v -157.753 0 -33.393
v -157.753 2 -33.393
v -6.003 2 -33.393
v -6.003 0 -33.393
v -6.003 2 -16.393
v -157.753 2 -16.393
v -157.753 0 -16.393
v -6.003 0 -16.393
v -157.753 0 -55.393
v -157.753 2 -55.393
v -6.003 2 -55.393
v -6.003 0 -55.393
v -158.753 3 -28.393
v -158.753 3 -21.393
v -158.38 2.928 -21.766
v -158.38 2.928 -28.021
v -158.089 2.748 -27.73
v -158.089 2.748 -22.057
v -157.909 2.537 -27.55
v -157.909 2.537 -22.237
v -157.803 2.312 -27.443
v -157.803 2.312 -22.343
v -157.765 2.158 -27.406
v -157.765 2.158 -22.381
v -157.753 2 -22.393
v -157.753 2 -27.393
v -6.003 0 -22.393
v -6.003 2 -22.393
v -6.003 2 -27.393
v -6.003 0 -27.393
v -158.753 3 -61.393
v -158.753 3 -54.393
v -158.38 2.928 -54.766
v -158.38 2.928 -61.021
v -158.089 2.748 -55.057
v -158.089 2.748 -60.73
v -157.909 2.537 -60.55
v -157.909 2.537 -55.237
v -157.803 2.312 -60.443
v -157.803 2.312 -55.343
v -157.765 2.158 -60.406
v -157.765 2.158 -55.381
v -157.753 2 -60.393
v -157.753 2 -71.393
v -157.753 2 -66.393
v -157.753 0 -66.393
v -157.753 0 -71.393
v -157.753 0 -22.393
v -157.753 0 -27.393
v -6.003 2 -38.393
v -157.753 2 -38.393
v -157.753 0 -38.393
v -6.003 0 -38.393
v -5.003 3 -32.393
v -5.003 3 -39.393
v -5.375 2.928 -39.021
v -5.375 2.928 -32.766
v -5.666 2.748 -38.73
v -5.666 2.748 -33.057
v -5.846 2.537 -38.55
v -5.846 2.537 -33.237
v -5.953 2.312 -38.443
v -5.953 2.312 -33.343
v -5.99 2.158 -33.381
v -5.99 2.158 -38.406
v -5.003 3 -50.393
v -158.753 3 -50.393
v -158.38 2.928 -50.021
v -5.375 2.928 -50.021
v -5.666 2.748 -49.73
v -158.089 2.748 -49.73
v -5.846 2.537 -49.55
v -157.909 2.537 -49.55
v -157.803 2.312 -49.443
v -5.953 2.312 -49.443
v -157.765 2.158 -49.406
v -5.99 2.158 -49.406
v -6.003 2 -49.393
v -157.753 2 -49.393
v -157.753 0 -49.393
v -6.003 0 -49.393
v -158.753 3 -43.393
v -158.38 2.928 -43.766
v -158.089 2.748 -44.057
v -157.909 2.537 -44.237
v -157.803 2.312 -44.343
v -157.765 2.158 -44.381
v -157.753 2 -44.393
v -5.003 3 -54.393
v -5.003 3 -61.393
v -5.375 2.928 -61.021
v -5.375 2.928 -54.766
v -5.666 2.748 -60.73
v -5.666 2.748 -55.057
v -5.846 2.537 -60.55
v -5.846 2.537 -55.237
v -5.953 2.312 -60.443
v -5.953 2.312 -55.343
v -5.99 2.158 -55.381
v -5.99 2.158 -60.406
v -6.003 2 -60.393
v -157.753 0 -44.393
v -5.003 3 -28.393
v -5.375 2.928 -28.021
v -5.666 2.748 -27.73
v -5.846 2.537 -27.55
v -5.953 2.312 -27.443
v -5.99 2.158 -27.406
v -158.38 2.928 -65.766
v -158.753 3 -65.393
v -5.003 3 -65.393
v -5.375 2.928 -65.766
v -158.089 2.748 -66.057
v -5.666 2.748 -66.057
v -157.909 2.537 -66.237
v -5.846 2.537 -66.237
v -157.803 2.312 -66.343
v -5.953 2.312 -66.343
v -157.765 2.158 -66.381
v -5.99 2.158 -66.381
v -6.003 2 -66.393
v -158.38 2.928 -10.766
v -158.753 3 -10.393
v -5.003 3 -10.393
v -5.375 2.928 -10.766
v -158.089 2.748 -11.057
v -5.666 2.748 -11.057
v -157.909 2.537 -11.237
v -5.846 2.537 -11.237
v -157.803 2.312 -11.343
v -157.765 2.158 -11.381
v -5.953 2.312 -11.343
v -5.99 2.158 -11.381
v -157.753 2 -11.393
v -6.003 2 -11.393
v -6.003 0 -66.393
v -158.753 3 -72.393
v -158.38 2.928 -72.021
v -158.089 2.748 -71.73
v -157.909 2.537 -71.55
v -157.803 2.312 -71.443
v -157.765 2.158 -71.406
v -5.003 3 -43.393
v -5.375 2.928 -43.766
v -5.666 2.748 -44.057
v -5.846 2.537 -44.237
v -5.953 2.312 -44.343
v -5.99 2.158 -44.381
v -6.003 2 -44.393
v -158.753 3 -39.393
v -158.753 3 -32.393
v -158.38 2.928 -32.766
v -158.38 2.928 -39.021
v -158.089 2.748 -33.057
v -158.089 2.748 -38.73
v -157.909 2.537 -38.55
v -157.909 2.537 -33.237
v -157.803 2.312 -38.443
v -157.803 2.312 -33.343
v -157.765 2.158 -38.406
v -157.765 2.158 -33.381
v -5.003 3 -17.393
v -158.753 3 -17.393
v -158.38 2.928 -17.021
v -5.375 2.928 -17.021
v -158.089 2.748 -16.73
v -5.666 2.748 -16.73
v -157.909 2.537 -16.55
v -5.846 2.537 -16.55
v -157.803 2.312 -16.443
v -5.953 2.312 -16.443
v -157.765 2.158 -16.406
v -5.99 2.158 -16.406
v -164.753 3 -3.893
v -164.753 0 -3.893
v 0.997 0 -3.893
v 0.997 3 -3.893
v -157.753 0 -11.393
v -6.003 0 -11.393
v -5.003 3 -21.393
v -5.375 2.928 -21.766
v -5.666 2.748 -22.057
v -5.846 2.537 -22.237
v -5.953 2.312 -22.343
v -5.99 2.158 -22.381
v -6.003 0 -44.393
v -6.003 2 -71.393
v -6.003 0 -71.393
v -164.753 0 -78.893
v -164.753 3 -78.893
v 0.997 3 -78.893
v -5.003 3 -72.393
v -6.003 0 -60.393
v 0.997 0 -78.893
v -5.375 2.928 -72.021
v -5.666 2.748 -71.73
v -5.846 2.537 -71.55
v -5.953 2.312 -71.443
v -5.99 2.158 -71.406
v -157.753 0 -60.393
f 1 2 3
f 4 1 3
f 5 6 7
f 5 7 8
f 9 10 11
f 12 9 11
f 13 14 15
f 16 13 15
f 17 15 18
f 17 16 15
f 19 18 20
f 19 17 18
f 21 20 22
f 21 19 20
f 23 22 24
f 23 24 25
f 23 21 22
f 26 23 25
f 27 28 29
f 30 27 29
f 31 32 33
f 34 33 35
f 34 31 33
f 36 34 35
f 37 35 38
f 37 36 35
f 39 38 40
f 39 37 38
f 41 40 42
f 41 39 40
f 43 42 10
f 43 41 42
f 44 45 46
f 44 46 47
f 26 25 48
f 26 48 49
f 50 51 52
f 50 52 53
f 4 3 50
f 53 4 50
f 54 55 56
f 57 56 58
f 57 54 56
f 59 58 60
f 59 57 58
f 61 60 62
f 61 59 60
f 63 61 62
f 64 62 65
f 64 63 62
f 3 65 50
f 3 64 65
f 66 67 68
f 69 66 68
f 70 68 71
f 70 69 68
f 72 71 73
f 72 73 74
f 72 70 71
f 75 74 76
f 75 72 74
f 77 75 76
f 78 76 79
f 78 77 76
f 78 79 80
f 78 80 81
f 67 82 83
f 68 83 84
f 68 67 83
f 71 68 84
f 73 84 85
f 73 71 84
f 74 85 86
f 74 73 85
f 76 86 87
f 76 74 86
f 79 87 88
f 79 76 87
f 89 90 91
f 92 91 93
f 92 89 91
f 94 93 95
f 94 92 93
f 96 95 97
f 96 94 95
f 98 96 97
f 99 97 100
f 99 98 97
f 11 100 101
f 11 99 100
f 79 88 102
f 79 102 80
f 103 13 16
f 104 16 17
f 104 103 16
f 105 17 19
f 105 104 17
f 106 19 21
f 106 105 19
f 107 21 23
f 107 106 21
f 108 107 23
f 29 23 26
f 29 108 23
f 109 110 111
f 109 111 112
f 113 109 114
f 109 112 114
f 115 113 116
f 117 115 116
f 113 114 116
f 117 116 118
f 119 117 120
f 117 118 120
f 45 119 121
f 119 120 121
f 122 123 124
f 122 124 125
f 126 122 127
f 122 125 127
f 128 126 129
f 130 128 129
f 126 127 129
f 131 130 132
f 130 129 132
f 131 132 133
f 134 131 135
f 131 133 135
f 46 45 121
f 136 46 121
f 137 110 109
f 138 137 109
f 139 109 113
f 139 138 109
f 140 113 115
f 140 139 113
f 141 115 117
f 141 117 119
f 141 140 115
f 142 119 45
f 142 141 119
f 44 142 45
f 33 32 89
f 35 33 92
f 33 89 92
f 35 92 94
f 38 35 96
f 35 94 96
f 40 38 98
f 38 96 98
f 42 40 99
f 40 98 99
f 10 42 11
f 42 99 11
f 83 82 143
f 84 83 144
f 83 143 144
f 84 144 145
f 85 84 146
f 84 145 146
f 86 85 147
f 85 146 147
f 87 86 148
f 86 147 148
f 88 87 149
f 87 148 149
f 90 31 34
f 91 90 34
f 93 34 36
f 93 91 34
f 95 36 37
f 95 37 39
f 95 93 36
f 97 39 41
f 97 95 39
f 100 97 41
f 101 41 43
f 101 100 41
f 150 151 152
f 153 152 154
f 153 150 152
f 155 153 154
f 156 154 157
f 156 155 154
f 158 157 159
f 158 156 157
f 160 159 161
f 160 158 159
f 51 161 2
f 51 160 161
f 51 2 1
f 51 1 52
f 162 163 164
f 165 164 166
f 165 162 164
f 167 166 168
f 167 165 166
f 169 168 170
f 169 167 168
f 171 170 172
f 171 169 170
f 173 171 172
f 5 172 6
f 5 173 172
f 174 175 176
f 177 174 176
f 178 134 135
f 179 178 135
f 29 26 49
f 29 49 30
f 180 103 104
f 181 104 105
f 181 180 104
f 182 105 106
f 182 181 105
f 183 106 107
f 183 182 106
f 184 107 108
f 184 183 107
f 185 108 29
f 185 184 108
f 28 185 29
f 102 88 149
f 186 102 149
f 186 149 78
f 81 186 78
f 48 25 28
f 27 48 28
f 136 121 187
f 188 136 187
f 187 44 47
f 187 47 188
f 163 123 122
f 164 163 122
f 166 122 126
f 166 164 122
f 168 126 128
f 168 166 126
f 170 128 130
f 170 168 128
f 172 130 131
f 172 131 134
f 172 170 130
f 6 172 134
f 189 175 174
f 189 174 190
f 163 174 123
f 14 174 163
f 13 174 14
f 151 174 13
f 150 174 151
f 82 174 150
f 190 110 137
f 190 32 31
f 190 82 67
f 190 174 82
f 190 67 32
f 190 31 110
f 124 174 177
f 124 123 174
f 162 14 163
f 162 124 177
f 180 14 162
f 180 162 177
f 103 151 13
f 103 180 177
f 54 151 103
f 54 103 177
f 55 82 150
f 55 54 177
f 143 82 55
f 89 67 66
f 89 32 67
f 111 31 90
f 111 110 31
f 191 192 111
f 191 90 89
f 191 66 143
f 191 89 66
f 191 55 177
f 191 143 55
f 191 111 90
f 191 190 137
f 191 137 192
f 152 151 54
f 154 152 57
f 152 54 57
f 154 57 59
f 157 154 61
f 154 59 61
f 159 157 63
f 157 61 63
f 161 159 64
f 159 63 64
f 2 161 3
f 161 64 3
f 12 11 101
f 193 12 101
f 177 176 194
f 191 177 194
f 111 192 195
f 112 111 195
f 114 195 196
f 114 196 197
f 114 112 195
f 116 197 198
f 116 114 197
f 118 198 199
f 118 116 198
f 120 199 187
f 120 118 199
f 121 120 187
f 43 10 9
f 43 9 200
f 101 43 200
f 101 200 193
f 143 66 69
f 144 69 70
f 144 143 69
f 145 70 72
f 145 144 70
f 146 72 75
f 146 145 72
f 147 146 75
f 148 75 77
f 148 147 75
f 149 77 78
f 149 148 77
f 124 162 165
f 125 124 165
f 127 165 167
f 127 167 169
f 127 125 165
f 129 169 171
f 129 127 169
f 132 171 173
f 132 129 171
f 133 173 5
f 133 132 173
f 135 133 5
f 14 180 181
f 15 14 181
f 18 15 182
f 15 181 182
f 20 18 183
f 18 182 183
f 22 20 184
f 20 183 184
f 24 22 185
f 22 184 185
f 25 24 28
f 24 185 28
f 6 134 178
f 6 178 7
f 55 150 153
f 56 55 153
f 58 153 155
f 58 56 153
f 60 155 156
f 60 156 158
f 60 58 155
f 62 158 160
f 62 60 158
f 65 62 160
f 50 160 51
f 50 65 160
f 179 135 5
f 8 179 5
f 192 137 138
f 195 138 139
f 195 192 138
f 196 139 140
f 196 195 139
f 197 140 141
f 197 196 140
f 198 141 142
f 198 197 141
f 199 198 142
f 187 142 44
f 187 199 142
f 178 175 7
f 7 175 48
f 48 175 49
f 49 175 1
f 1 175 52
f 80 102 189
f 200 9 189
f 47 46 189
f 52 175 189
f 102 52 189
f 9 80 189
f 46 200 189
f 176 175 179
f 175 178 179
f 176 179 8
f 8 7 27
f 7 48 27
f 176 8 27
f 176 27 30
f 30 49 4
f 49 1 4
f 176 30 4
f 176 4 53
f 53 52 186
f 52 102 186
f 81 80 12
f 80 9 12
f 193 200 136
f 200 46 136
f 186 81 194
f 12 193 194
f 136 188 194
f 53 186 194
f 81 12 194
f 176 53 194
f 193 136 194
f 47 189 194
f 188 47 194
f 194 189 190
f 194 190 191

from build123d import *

# Parameters (mm, degrees)
SKETCH1_W           = 165.75
SKETCH1_H           = 75
BOSS_EXTRUDE1_DEPTH = 3
SKETCH2_W           = 151.75
SKETCH2_H           = 5
CUT_EXTRUDE1_DEPTH  = 183.692731916
FILLET4_R           = 1
FILLET5_R           = 1
FILLET6_R           = 1
FILLET7_R           = 1
FILLET8_R           = 1
FILLET9_R           = 1
FILLET10_R          = 1
FILLET11_R          = 1
FILLET12_R          = 1
FILLET13_R          = 1
FILLET14_R          = 1
FILLET15_R          = 1
FILLET16_R          = 1
FILLET17_R          = 1
FILLET18_R          = 1
FILLET19_R          = 1
FILLET20_R          = 1
FILLET21_R          = 1
FILLET22_R          = 1
FILLET23_R          = 1
FILLET24_R          = 1
FILLET25_R          = 1
FILLET26_R          = 1
FILLET27_R          = 1


with BuildPart() as part:
    # Sketch1 → Boss-Extrude1 (new body)
    with BuildSketch(Plane(origin=(0, 0, 0), x_dir=(1, 0, 0), z_dir=(0, 1, 0))):
        with Locations((-81.877808989, 41.393258427)):
            Rectangle(SKETCH1_W, SKETCH1_H)
    extrude(amount=BOSS_EXTRUDE1_DEPTH)

    # Sketch2 → Cut-Extrude1 (cut, through all)
    with BuildSketch(Plane(origin=(0, 3, 0), x_dir=(1, 0, 0), z_dir=(0, 1, 0))):
        with Locations((-81.877808989, 68.893258427)):
            Rectangle(SKETCH2_W, SKETCH2_H)
        with Locations((-81.877808989, 57.893258427)):
            Rectangle(SKETCH2_W, SKETCH2_H)
        with Locations((-81.877808989, 46.893258427)):
            Rectangle(SKETCH2_W, SKETCH2_H)
        with Locations((-81.877808989, 35.893258427)):
            Rectangle(SKETCH2_W, SKETCH2_H)
        with Locations((-81.877808989, 24.893258427)):
            Rectangle(SKETCH2_W, SKETCH2_H)
        with Locations((-81.877808989, 13.893258427)):
            Rectangle(SKETCH2_W, SKETCH2_H)
    extrude(amount=-CUT_EXTRUDE1_DEPTH, mode=Mode.SUBTRACT)

    # Fillet4
    fillet4_edges = [part.edges().sort_by_distance(p)[0] for p in [
        (-81.877808989, 3, -60.393258427),
    ]]
    fillet(fillet4_edges, radius=FILLET4_R)

    # Fillet5
    fillet5_edges = [part.edges().sort_by_distance(p)[0] for p in [
        (-81.877808989, 3, -66.393258427),
    ]]
    fillet(fillet5_edges, radius=FILLET5_R)

    # Fillet6
    fillet6_edges = [part.edges().sort_by_distance(p)[0] for p in [
        (-81.877808989, 3, -49.393258427),
    ]]
    fillet(fillet6_edges, radius=FILLET6_R)

    # Fillet7
    fillet7_edges = [part.edges().sort_by_distance(p)[0] for p in [
        (-81.877808989, 3, -55.393258427),
    ]]
    fillet(fillet7_edges, radius=FILLET7_R)

    # Fillet8
    fillet8_edges = [part.edges().sort_by_distance(p)[0] for p in [
        (-81.877808989, 3, -38.393258427),
    ]]
    fillet(fillet8_edges, radius=FILLET8_R)

    # Fillet9
    fillet9_edges = [part.edges().sort_by_distance(p)[0] for p in [
        (-81.877808989, 3, -44.393258427),
    ]]
    fillet(fillet9_edges, radius=FILLET9_R)

    # Fillet10
    fillet10_edges = [part.edges().sort_by_distance(p)[0] for p in [
        (-81.877808989, 3, -33.393258427),
    ]]
    fillet(fillet10_edges, radius=FILLET10_R)

    # Fillet11
    fillet11_edges = [part.edges().sort_by_distance(p)[0] for p in [
        (-81.877808989, 3, -27.393258427),
    ]]
    fillet(fillet11_edges, radius=FILLET11_R)

    # Fillet12
    fillet12_edges = [part.edges().sort_by_distance(p)[0] for p in [
        (-81.877808989, 3, -22.393258427),
    ]]
    fillet(fillet12_edges, radius=FILLET12_R)

    # Fillet13
    fillet13_edges = [part.edges().sort_by_distance(p)[0] for p in [
        (-81.877808989, 3, -16.393258427),
    ]]
    fillet(fillet13_edges, radius=FILLET13_R)

    # Fillet14
    fillet14_edges = [part.edges().sort_by_distance(p)[0] for p in [
        (-81.877808989, 3, -11.393258427),
    ]]
    fillet(fillet14_edges, radius=FILLET14_R)

    # Fillet15
    fillet15_edges = [part.edges().sort_by_distance(p)[0] for p in [
        (-81.877808989, 3, -71.393258427),
    ]]
    fillet(fillet15_edges, radius=FILLET15_R)

    # Fillet16
    fillet16_edges = [part.edges().sort_by_distance(p)[0] for p in [
        (-157.752808989, 3, -68.893258427),
    ]]
    fillet(fillet16_edges, radius=FILLET16_R)

    # Fillet17
    fillet17_edges = [part.edges().sort_by_distance(p)[0] for p in [
        (-157.752808989, 3, -57.893258427),
    ]]
    fillet(fillet17_edges, radius=FILLET17_R)

    # Fillet18
    fillet18_edges = [part.edges().sort_by_distance(p)[0] for p in [
        (-157.752808989, 3, -46.893258427),
    ]]
    fillet(fillet18_edges, radius=FILLET18_R)

    # Fillet19
    fillet19_edges = [part.edges().sort_by_distance(p)[0] for p in [
        (-157.752808989, 3, -35.893258427),
    ]]
    fillet(fillet19_edges, radius=FILLET19_R)

    # Fillet20
    fillet20_edges = [part.edges().sort_by_distance(p)[0] for p in [
        (-157.752808989, 3, -24.893258427),
    ]]
    fillet(fillet20_edges, radius=FILLET20_R)

    # Fillet21
    fillet21_edges = [part.edges().sort_by_distance(p)[0] for p in [
        (-157.752808989, 3, -13.893258427),
    ]]
    fillet(fillet21_edges, radius=FILLET21_R)

    # Fillet22
    fillet22_edges = [part.edges().sort_by_distance(p)[0] for p in [
        (-6.002808989, 3, -13.893258427),
    ]]
    fillet(fillet22_edges, radius=FILLET22_R)

    # Fillet23
    fillet23_edges = [part.edges().sort_by_distance(p)[0] for p in [
        (-6.002808989, 3, -24.893258427),
    ]]
    fillet(fillet23_edges, radius=FILLET23_R)

    # Fillet24
    fillet24_edges = [part.edges().sort_by_distance(p)[0] for p in [
        (-6.002808989, 3, -35.893258427),
    ]]
    fillet(fillet24_edges, radius=FILLET24_R)

    # Fillet25
    fillet25_edges = [part.edges().sort_by_distance(p)[0] for p in [
        (-6.002808989, 3, -46.893258427),
    ]]
    fillet(fillet25_edges, radius=FILLET25_R)

    # Fillet26
    fillet26_edges = [part.edges().sort_by_distance(p)[0] for p in [
        (-6.002808989, 3, -57.893258427),
    ]]
    fillet(fillet26_edges, radius=FILLET26_R)

    # Fillet27
    fillet27_edges = [part.edges().sort_by_distance(p)[0] for p in [
        (-6.002808989, 3, -68.893258427),
    ]]
    fillet(fillet27_edges, radius=FILLET27_R)


solid = part.part
